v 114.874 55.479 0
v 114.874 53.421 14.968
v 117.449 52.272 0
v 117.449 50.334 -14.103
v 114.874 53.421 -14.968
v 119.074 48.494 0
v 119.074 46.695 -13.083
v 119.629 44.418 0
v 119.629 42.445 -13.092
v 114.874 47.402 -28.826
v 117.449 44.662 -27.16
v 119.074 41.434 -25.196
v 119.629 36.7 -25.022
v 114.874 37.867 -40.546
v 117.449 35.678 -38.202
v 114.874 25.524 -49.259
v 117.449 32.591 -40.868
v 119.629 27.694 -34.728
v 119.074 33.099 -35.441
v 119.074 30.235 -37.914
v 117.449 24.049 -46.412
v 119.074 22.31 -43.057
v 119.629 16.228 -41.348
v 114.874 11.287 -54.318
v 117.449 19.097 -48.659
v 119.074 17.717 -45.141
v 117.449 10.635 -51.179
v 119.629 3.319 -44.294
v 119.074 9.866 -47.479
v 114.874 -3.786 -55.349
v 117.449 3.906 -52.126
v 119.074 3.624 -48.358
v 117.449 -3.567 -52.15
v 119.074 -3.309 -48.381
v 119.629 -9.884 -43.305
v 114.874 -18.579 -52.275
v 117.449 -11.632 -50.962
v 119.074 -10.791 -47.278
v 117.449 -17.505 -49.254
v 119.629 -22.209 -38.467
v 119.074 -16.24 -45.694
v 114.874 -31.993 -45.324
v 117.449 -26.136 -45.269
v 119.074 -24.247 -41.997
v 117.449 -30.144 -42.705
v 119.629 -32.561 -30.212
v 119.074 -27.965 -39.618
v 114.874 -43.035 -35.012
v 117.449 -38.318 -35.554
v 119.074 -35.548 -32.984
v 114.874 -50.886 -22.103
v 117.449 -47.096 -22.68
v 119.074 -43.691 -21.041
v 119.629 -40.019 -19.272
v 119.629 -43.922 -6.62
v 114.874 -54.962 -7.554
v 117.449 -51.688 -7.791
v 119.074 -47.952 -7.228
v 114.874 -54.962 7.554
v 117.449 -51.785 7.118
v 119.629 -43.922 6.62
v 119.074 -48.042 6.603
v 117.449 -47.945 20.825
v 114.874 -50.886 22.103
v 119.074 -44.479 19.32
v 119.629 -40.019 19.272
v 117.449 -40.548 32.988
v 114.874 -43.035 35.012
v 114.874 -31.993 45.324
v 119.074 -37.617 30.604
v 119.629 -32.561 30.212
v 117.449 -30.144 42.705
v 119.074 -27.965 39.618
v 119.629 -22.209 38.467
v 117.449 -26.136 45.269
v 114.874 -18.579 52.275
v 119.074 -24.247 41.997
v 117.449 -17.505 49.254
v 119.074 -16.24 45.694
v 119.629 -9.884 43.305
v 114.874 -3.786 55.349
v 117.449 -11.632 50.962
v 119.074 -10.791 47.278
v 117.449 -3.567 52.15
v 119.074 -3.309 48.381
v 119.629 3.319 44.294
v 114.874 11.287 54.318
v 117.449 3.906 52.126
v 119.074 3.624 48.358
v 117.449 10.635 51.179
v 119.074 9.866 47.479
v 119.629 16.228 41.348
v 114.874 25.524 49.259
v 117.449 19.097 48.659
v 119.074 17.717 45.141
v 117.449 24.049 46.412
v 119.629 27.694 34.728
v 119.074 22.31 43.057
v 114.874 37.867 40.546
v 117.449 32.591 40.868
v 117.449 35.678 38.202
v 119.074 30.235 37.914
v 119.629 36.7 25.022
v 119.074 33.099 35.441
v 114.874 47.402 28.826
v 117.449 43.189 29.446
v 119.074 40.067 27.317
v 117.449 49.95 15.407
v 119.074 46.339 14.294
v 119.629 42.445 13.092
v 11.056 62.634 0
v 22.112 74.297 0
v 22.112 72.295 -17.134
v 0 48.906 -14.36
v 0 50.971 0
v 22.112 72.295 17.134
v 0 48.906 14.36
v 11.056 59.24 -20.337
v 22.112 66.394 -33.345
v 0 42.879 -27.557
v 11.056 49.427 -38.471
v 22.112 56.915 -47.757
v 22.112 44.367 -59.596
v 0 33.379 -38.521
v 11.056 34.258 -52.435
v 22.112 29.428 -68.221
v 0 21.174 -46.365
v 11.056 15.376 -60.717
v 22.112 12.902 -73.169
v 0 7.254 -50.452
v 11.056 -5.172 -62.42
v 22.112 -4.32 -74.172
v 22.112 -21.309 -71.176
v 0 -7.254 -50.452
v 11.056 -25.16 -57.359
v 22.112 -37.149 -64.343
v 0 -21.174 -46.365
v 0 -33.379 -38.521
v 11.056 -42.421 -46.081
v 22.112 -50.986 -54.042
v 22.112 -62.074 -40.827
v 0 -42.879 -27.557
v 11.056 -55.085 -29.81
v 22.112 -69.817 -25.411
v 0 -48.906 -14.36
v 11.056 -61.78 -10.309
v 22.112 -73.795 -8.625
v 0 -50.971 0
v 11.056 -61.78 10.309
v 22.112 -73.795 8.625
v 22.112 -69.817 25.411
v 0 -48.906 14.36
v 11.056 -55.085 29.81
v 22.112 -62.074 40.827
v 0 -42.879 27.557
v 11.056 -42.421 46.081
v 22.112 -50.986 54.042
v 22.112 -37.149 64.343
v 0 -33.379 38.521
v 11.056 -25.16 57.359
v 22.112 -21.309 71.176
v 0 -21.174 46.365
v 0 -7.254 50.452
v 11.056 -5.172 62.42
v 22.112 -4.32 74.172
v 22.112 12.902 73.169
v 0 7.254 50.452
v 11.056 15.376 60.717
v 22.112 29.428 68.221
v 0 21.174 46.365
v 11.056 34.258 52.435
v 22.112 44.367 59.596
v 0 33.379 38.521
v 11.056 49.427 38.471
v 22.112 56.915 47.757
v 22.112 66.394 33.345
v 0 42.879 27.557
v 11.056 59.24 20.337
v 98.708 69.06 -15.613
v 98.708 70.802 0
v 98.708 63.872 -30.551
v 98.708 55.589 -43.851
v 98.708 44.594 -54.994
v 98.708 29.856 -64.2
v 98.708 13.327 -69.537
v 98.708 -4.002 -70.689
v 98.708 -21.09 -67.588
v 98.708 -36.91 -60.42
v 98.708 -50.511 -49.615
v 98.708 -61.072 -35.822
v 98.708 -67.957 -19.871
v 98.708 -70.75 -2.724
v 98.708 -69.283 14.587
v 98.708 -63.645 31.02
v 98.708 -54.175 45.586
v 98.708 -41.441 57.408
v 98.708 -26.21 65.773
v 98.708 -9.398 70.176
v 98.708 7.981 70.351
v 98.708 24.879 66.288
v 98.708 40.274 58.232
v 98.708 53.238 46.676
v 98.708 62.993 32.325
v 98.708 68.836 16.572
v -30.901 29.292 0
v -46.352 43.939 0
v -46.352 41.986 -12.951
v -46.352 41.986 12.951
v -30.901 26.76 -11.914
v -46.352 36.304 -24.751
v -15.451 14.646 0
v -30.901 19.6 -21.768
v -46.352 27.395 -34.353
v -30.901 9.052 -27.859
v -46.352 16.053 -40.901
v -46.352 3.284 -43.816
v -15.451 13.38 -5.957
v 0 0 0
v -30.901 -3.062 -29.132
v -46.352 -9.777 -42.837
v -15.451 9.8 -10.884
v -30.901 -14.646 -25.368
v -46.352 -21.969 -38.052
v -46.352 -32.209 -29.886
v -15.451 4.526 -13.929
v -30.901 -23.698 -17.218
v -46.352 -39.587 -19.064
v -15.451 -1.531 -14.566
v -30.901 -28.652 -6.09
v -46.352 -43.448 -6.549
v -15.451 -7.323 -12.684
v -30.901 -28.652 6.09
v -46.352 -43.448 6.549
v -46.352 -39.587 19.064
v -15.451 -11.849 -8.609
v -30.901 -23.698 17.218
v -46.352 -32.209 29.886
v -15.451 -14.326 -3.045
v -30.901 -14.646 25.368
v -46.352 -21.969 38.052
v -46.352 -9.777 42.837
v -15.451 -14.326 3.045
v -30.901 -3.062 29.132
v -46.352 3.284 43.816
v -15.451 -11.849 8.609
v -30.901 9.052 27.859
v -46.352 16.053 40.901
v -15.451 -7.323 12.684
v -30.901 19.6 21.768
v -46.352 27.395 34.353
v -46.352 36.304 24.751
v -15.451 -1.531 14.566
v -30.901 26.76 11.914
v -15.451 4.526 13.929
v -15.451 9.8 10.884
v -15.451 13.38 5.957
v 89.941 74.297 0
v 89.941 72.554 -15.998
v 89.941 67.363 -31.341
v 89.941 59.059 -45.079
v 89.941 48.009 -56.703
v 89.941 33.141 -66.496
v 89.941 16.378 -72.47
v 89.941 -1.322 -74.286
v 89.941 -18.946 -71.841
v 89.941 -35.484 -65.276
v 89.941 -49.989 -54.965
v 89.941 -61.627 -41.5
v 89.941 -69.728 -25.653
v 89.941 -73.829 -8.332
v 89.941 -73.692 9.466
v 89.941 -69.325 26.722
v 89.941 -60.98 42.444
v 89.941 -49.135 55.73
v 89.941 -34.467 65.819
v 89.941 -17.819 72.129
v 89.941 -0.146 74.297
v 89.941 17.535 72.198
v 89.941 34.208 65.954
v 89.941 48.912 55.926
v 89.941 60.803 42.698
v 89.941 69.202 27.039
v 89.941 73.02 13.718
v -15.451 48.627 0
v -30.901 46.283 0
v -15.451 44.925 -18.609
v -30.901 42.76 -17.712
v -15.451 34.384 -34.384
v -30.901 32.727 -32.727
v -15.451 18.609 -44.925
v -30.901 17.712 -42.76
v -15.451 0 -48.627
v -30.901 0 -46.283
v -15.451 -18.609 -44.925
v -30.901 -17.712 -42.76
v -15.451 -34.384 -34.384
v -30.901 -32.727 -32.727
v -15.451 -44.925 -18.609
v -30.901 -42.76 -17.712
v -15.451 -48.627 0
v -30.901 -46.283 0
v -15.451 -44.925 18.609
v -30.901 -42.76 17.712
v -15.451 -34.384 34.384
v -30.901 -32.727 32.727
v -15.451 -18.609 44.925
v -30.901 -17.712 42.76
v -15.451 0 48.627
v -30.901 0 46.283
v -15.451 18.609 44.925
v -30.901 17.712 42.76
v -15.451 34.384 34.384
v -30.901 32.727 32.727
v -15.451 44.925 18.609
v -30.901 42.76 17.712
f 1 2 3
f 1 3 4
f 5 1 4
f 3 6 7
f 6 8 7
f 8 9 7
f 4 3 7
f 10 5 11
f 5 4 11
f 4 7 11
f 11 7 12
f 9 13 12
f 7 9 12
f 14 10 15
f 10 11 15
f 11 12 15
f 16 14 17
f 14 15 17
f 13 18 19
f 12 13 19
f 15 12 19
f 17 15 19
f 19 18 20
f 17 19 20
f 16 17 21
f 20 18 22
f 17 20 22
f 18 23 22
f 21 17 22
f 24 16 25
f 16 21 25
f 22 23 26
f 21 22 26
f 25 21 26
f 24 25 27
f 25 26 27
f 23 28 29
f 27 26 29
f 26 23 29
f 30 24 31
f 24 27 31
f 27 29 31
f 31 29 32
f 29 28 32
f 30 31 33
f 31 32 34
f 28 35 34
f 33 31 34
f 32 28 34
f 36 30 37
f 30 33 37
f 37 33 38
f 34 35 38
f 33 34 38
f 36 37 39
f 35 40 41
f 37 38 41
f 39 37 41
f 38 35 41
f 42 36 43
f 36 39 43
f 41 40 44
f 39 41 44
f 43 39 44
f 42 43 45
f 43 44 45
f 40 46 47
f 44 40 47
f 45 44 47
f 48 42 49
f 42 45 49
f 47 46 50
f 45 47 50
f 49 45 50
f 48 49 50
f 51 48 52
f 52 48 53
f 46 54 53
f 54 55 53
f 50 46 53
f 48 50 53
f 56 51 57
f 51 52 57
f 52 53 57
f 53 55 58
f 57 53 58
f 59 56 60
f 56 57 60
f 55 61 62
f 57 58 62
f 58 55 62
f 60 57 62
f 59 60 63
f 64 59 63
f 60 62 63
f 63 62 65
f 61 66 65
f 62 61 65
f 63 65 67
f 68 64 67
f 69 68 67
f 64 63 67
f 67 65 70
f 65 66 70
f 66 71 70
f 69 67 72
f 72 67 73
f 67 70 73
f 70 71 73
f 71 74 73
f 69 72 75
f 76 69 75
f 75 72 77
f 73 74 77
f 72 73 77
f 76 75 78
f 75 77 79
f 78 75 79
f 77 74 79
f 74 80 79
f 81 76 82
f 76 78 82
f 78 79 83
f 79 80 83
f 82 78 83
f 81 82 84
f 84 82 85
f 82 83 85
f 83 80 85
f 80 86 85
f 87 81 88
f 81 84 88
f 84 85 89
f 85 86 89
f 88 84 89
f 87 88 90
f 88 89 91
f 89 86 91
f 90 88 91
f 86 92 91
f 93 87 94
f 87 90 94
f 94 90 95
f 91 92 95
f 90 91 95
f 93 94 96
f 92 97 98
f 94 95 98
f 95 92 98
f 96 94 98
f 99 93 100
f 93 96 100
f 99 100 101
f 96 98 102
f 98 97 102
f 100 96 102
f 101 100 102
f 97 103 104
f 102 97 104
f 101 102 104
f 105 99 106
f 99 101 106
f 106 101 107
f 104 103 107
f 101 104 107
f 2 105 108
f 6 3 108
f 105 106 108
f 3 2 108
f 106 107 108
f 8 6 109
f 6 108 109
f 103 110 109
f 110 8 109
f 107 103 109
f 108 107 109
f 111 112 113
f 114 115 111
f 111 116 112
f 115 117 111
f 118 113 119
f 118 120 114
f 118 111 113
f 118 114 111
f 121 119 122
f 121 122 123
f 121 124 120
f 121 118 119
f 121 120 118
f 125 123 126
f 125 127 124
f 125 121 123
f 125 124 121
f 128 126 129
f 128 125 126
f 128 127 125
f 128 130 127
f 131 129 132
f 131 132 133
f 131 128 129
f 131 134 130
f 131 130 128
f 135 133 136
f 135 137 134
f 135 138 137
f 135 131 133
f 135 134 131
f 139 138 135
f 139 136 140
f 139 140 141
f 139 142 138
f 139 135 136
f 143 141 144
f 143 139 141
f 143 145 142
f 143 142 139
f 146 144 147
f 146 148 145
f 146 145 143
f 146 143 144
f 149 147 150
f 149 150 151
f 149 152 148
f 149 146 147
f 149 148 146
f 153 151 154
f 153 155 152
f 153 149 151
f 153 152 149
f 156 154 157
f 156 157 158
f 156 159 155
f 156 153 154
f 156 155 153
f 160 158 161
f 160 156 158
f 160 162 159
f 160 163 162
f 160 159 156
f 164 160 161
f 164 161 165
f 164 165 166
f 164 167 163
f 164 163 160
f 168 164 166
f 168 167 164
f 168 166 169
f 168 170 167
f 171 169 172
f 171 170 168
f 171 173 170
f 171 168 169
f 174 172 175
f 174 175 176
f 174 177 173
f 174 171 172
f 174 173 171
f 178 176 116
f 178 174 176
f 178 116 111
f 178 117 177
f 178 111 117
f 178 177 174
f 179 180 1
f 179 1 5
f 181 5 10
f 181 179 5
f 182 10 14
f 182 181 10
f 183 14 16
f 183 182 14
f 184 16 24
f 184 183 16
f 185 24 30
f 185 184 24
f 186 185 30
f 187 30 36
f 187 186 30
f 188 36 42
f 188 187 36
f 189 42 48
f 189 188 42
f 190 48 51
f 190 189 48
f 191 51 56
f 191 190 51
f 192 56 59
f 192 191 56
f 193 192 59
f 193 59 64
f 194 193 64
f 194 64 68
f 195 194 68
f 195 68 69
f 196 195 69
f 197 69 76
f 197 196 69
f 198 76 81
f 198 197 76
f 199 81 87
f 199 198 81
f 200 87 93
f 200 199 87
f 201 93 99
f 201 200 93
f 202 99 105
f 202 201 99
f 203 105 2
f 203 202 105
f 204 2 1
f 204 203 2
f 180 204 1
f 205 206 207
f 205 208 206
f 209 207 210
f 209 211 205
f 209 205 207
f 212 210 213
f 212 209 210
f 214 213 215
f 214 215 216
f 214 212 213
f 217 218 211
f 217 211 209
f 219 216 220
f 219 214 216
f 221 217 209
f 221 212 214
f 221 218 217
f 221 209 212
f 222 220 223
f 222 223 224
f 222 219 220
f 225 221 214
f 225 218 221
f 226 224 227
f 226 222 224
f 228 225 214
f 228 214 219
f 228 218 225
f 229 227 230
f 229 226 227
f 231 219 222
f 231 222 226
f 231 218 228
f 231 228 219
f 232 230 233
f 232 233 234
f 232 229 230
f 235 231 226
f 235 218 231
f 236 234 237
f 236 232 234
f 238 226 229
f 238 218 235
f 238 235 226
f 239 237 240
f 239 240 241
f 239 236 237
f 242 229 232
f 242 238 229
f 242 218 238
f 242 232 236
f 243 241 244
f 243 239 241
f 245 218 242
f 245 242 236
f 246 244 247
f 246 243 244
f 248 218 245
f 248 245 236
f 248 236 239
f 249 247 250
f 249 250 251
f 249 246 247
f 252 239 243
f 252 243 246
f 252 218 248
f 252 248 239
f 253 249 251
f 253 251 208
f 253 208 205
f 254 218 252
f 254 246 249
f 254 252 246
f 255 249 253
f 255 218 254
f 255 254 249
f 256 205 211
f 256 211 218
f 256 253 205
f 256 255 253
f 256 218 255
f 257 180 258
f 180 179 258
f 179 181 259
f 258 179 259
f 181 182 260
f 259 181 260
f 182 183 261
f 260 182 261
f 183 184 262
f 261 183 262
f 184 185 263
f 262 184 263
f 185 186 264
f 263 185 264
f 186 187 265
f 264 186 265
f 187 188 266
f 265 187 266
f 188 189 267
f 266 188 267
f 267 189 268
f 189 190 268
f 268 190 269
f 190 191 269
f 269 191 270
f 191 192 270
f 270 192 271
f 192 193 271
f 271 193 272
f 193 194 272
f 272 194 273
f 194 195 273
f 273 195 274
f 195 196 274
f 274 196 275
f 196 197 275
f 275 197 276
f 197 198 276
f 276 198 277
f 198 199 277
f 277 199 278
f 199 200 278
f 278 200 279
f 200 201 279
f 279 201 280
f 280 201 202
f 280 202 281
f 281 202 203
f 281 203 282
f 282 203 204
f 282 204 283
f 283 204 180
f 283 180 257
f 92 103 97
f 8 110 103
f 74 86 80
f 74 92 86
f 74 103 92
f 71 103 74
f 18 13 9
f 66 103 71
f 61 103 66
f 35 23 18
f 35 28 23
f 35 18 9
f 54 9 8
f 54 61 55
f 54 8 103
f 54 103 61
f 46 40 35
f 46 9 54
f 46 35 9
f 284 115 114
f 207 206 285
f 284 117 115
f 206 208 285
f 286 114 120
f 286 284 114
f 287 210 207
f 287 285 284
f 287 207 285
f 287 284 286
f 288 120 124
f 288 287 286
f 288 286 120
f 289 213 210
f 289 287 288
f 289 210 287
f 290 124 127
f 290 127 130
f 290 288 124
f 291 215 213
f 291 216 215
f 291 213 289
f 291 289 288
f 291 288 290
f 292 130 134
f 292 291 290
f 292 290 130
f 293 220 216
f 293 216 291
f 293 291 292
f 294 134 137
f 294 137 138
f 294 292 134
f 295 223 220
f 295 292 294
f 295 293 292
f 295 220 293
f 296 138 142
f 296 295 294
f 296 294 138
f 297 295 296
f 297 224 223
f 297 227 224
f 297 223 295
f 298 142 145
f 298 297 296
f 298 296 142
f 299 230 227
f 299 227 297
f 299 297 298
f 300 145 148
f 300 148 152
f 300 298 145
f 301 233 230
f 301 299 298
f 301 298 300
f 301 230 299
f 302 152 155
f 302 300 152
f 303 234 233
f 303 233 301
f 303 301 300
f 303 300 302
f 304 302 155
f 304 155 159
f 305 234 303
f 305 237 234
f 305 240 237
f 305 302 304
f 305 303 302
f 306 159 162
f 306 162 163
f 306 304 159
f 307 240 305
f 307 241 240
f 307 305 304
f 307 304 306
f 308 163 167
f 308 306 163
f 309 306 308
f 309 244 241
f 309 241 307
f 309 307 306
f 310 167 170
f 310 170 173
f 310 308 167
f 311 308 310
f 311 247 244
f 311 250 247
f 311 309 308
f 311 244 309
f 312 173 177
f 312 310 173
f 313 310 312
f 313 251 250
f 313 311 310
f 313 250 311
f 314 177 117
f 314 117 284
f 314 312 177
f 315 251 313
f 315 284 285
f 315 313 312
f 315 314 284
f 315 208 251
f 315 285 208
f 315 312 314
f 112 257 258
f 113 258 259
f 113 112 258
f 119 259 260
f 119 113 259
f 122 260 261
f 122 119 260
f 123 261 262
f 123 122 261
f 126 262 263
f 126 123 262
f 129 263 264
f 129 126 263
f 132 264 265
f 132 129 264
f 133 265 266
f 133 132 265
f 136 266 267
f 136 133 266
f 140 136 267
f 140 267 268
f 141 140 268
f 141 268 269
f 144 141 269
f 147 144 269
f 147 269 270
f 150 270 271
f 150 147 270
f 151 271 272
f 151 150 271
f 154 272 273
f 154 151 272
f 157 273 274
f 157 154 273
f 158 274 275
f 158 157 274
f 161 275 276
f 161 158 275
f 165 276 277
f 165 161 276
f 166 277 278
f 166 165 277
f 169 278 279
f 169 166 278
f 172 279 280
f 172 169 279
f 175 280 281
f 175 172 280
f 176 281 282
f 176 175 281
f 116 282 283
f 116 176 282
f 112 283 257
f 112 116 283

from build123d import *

# Parameters (mm, degrees)
F2_SIZE = 5.08
F3_R    = 15.24


with BuildPart() as f1:
    # F0 (on Top) → F1 (revolve)
    with BuildSketch(Plane.XY):
        Polygon((-46.351972, 43.938525), (0, 0), (0, 50.97072), align=None)
        Polygon((0, 50.97072), (0, 0), (119.629055, 0), (119.629055, 50.97072), (95.021219, 74.297279), (22.111996, 74.297279), align=None)
    revolve(axis=Axis((59.814528, 0, 0), (-1, 0, 0)))

    # F2
    f2_edges = [f1.edges().sort_by_distance(p)[0] for p in [
        (95.021219, -74.297279, 0),
    ]]
    chamfer(f2_edges, length=F2_SIZE)

    # F3
    f3_edges = [f1.edges().sort_by_distance(p)[0] for p in [
        (119.629055, -50.97072, 0),
    ]]
    fillet(f3_edges, radius=F3_R)


solid = f1.part
